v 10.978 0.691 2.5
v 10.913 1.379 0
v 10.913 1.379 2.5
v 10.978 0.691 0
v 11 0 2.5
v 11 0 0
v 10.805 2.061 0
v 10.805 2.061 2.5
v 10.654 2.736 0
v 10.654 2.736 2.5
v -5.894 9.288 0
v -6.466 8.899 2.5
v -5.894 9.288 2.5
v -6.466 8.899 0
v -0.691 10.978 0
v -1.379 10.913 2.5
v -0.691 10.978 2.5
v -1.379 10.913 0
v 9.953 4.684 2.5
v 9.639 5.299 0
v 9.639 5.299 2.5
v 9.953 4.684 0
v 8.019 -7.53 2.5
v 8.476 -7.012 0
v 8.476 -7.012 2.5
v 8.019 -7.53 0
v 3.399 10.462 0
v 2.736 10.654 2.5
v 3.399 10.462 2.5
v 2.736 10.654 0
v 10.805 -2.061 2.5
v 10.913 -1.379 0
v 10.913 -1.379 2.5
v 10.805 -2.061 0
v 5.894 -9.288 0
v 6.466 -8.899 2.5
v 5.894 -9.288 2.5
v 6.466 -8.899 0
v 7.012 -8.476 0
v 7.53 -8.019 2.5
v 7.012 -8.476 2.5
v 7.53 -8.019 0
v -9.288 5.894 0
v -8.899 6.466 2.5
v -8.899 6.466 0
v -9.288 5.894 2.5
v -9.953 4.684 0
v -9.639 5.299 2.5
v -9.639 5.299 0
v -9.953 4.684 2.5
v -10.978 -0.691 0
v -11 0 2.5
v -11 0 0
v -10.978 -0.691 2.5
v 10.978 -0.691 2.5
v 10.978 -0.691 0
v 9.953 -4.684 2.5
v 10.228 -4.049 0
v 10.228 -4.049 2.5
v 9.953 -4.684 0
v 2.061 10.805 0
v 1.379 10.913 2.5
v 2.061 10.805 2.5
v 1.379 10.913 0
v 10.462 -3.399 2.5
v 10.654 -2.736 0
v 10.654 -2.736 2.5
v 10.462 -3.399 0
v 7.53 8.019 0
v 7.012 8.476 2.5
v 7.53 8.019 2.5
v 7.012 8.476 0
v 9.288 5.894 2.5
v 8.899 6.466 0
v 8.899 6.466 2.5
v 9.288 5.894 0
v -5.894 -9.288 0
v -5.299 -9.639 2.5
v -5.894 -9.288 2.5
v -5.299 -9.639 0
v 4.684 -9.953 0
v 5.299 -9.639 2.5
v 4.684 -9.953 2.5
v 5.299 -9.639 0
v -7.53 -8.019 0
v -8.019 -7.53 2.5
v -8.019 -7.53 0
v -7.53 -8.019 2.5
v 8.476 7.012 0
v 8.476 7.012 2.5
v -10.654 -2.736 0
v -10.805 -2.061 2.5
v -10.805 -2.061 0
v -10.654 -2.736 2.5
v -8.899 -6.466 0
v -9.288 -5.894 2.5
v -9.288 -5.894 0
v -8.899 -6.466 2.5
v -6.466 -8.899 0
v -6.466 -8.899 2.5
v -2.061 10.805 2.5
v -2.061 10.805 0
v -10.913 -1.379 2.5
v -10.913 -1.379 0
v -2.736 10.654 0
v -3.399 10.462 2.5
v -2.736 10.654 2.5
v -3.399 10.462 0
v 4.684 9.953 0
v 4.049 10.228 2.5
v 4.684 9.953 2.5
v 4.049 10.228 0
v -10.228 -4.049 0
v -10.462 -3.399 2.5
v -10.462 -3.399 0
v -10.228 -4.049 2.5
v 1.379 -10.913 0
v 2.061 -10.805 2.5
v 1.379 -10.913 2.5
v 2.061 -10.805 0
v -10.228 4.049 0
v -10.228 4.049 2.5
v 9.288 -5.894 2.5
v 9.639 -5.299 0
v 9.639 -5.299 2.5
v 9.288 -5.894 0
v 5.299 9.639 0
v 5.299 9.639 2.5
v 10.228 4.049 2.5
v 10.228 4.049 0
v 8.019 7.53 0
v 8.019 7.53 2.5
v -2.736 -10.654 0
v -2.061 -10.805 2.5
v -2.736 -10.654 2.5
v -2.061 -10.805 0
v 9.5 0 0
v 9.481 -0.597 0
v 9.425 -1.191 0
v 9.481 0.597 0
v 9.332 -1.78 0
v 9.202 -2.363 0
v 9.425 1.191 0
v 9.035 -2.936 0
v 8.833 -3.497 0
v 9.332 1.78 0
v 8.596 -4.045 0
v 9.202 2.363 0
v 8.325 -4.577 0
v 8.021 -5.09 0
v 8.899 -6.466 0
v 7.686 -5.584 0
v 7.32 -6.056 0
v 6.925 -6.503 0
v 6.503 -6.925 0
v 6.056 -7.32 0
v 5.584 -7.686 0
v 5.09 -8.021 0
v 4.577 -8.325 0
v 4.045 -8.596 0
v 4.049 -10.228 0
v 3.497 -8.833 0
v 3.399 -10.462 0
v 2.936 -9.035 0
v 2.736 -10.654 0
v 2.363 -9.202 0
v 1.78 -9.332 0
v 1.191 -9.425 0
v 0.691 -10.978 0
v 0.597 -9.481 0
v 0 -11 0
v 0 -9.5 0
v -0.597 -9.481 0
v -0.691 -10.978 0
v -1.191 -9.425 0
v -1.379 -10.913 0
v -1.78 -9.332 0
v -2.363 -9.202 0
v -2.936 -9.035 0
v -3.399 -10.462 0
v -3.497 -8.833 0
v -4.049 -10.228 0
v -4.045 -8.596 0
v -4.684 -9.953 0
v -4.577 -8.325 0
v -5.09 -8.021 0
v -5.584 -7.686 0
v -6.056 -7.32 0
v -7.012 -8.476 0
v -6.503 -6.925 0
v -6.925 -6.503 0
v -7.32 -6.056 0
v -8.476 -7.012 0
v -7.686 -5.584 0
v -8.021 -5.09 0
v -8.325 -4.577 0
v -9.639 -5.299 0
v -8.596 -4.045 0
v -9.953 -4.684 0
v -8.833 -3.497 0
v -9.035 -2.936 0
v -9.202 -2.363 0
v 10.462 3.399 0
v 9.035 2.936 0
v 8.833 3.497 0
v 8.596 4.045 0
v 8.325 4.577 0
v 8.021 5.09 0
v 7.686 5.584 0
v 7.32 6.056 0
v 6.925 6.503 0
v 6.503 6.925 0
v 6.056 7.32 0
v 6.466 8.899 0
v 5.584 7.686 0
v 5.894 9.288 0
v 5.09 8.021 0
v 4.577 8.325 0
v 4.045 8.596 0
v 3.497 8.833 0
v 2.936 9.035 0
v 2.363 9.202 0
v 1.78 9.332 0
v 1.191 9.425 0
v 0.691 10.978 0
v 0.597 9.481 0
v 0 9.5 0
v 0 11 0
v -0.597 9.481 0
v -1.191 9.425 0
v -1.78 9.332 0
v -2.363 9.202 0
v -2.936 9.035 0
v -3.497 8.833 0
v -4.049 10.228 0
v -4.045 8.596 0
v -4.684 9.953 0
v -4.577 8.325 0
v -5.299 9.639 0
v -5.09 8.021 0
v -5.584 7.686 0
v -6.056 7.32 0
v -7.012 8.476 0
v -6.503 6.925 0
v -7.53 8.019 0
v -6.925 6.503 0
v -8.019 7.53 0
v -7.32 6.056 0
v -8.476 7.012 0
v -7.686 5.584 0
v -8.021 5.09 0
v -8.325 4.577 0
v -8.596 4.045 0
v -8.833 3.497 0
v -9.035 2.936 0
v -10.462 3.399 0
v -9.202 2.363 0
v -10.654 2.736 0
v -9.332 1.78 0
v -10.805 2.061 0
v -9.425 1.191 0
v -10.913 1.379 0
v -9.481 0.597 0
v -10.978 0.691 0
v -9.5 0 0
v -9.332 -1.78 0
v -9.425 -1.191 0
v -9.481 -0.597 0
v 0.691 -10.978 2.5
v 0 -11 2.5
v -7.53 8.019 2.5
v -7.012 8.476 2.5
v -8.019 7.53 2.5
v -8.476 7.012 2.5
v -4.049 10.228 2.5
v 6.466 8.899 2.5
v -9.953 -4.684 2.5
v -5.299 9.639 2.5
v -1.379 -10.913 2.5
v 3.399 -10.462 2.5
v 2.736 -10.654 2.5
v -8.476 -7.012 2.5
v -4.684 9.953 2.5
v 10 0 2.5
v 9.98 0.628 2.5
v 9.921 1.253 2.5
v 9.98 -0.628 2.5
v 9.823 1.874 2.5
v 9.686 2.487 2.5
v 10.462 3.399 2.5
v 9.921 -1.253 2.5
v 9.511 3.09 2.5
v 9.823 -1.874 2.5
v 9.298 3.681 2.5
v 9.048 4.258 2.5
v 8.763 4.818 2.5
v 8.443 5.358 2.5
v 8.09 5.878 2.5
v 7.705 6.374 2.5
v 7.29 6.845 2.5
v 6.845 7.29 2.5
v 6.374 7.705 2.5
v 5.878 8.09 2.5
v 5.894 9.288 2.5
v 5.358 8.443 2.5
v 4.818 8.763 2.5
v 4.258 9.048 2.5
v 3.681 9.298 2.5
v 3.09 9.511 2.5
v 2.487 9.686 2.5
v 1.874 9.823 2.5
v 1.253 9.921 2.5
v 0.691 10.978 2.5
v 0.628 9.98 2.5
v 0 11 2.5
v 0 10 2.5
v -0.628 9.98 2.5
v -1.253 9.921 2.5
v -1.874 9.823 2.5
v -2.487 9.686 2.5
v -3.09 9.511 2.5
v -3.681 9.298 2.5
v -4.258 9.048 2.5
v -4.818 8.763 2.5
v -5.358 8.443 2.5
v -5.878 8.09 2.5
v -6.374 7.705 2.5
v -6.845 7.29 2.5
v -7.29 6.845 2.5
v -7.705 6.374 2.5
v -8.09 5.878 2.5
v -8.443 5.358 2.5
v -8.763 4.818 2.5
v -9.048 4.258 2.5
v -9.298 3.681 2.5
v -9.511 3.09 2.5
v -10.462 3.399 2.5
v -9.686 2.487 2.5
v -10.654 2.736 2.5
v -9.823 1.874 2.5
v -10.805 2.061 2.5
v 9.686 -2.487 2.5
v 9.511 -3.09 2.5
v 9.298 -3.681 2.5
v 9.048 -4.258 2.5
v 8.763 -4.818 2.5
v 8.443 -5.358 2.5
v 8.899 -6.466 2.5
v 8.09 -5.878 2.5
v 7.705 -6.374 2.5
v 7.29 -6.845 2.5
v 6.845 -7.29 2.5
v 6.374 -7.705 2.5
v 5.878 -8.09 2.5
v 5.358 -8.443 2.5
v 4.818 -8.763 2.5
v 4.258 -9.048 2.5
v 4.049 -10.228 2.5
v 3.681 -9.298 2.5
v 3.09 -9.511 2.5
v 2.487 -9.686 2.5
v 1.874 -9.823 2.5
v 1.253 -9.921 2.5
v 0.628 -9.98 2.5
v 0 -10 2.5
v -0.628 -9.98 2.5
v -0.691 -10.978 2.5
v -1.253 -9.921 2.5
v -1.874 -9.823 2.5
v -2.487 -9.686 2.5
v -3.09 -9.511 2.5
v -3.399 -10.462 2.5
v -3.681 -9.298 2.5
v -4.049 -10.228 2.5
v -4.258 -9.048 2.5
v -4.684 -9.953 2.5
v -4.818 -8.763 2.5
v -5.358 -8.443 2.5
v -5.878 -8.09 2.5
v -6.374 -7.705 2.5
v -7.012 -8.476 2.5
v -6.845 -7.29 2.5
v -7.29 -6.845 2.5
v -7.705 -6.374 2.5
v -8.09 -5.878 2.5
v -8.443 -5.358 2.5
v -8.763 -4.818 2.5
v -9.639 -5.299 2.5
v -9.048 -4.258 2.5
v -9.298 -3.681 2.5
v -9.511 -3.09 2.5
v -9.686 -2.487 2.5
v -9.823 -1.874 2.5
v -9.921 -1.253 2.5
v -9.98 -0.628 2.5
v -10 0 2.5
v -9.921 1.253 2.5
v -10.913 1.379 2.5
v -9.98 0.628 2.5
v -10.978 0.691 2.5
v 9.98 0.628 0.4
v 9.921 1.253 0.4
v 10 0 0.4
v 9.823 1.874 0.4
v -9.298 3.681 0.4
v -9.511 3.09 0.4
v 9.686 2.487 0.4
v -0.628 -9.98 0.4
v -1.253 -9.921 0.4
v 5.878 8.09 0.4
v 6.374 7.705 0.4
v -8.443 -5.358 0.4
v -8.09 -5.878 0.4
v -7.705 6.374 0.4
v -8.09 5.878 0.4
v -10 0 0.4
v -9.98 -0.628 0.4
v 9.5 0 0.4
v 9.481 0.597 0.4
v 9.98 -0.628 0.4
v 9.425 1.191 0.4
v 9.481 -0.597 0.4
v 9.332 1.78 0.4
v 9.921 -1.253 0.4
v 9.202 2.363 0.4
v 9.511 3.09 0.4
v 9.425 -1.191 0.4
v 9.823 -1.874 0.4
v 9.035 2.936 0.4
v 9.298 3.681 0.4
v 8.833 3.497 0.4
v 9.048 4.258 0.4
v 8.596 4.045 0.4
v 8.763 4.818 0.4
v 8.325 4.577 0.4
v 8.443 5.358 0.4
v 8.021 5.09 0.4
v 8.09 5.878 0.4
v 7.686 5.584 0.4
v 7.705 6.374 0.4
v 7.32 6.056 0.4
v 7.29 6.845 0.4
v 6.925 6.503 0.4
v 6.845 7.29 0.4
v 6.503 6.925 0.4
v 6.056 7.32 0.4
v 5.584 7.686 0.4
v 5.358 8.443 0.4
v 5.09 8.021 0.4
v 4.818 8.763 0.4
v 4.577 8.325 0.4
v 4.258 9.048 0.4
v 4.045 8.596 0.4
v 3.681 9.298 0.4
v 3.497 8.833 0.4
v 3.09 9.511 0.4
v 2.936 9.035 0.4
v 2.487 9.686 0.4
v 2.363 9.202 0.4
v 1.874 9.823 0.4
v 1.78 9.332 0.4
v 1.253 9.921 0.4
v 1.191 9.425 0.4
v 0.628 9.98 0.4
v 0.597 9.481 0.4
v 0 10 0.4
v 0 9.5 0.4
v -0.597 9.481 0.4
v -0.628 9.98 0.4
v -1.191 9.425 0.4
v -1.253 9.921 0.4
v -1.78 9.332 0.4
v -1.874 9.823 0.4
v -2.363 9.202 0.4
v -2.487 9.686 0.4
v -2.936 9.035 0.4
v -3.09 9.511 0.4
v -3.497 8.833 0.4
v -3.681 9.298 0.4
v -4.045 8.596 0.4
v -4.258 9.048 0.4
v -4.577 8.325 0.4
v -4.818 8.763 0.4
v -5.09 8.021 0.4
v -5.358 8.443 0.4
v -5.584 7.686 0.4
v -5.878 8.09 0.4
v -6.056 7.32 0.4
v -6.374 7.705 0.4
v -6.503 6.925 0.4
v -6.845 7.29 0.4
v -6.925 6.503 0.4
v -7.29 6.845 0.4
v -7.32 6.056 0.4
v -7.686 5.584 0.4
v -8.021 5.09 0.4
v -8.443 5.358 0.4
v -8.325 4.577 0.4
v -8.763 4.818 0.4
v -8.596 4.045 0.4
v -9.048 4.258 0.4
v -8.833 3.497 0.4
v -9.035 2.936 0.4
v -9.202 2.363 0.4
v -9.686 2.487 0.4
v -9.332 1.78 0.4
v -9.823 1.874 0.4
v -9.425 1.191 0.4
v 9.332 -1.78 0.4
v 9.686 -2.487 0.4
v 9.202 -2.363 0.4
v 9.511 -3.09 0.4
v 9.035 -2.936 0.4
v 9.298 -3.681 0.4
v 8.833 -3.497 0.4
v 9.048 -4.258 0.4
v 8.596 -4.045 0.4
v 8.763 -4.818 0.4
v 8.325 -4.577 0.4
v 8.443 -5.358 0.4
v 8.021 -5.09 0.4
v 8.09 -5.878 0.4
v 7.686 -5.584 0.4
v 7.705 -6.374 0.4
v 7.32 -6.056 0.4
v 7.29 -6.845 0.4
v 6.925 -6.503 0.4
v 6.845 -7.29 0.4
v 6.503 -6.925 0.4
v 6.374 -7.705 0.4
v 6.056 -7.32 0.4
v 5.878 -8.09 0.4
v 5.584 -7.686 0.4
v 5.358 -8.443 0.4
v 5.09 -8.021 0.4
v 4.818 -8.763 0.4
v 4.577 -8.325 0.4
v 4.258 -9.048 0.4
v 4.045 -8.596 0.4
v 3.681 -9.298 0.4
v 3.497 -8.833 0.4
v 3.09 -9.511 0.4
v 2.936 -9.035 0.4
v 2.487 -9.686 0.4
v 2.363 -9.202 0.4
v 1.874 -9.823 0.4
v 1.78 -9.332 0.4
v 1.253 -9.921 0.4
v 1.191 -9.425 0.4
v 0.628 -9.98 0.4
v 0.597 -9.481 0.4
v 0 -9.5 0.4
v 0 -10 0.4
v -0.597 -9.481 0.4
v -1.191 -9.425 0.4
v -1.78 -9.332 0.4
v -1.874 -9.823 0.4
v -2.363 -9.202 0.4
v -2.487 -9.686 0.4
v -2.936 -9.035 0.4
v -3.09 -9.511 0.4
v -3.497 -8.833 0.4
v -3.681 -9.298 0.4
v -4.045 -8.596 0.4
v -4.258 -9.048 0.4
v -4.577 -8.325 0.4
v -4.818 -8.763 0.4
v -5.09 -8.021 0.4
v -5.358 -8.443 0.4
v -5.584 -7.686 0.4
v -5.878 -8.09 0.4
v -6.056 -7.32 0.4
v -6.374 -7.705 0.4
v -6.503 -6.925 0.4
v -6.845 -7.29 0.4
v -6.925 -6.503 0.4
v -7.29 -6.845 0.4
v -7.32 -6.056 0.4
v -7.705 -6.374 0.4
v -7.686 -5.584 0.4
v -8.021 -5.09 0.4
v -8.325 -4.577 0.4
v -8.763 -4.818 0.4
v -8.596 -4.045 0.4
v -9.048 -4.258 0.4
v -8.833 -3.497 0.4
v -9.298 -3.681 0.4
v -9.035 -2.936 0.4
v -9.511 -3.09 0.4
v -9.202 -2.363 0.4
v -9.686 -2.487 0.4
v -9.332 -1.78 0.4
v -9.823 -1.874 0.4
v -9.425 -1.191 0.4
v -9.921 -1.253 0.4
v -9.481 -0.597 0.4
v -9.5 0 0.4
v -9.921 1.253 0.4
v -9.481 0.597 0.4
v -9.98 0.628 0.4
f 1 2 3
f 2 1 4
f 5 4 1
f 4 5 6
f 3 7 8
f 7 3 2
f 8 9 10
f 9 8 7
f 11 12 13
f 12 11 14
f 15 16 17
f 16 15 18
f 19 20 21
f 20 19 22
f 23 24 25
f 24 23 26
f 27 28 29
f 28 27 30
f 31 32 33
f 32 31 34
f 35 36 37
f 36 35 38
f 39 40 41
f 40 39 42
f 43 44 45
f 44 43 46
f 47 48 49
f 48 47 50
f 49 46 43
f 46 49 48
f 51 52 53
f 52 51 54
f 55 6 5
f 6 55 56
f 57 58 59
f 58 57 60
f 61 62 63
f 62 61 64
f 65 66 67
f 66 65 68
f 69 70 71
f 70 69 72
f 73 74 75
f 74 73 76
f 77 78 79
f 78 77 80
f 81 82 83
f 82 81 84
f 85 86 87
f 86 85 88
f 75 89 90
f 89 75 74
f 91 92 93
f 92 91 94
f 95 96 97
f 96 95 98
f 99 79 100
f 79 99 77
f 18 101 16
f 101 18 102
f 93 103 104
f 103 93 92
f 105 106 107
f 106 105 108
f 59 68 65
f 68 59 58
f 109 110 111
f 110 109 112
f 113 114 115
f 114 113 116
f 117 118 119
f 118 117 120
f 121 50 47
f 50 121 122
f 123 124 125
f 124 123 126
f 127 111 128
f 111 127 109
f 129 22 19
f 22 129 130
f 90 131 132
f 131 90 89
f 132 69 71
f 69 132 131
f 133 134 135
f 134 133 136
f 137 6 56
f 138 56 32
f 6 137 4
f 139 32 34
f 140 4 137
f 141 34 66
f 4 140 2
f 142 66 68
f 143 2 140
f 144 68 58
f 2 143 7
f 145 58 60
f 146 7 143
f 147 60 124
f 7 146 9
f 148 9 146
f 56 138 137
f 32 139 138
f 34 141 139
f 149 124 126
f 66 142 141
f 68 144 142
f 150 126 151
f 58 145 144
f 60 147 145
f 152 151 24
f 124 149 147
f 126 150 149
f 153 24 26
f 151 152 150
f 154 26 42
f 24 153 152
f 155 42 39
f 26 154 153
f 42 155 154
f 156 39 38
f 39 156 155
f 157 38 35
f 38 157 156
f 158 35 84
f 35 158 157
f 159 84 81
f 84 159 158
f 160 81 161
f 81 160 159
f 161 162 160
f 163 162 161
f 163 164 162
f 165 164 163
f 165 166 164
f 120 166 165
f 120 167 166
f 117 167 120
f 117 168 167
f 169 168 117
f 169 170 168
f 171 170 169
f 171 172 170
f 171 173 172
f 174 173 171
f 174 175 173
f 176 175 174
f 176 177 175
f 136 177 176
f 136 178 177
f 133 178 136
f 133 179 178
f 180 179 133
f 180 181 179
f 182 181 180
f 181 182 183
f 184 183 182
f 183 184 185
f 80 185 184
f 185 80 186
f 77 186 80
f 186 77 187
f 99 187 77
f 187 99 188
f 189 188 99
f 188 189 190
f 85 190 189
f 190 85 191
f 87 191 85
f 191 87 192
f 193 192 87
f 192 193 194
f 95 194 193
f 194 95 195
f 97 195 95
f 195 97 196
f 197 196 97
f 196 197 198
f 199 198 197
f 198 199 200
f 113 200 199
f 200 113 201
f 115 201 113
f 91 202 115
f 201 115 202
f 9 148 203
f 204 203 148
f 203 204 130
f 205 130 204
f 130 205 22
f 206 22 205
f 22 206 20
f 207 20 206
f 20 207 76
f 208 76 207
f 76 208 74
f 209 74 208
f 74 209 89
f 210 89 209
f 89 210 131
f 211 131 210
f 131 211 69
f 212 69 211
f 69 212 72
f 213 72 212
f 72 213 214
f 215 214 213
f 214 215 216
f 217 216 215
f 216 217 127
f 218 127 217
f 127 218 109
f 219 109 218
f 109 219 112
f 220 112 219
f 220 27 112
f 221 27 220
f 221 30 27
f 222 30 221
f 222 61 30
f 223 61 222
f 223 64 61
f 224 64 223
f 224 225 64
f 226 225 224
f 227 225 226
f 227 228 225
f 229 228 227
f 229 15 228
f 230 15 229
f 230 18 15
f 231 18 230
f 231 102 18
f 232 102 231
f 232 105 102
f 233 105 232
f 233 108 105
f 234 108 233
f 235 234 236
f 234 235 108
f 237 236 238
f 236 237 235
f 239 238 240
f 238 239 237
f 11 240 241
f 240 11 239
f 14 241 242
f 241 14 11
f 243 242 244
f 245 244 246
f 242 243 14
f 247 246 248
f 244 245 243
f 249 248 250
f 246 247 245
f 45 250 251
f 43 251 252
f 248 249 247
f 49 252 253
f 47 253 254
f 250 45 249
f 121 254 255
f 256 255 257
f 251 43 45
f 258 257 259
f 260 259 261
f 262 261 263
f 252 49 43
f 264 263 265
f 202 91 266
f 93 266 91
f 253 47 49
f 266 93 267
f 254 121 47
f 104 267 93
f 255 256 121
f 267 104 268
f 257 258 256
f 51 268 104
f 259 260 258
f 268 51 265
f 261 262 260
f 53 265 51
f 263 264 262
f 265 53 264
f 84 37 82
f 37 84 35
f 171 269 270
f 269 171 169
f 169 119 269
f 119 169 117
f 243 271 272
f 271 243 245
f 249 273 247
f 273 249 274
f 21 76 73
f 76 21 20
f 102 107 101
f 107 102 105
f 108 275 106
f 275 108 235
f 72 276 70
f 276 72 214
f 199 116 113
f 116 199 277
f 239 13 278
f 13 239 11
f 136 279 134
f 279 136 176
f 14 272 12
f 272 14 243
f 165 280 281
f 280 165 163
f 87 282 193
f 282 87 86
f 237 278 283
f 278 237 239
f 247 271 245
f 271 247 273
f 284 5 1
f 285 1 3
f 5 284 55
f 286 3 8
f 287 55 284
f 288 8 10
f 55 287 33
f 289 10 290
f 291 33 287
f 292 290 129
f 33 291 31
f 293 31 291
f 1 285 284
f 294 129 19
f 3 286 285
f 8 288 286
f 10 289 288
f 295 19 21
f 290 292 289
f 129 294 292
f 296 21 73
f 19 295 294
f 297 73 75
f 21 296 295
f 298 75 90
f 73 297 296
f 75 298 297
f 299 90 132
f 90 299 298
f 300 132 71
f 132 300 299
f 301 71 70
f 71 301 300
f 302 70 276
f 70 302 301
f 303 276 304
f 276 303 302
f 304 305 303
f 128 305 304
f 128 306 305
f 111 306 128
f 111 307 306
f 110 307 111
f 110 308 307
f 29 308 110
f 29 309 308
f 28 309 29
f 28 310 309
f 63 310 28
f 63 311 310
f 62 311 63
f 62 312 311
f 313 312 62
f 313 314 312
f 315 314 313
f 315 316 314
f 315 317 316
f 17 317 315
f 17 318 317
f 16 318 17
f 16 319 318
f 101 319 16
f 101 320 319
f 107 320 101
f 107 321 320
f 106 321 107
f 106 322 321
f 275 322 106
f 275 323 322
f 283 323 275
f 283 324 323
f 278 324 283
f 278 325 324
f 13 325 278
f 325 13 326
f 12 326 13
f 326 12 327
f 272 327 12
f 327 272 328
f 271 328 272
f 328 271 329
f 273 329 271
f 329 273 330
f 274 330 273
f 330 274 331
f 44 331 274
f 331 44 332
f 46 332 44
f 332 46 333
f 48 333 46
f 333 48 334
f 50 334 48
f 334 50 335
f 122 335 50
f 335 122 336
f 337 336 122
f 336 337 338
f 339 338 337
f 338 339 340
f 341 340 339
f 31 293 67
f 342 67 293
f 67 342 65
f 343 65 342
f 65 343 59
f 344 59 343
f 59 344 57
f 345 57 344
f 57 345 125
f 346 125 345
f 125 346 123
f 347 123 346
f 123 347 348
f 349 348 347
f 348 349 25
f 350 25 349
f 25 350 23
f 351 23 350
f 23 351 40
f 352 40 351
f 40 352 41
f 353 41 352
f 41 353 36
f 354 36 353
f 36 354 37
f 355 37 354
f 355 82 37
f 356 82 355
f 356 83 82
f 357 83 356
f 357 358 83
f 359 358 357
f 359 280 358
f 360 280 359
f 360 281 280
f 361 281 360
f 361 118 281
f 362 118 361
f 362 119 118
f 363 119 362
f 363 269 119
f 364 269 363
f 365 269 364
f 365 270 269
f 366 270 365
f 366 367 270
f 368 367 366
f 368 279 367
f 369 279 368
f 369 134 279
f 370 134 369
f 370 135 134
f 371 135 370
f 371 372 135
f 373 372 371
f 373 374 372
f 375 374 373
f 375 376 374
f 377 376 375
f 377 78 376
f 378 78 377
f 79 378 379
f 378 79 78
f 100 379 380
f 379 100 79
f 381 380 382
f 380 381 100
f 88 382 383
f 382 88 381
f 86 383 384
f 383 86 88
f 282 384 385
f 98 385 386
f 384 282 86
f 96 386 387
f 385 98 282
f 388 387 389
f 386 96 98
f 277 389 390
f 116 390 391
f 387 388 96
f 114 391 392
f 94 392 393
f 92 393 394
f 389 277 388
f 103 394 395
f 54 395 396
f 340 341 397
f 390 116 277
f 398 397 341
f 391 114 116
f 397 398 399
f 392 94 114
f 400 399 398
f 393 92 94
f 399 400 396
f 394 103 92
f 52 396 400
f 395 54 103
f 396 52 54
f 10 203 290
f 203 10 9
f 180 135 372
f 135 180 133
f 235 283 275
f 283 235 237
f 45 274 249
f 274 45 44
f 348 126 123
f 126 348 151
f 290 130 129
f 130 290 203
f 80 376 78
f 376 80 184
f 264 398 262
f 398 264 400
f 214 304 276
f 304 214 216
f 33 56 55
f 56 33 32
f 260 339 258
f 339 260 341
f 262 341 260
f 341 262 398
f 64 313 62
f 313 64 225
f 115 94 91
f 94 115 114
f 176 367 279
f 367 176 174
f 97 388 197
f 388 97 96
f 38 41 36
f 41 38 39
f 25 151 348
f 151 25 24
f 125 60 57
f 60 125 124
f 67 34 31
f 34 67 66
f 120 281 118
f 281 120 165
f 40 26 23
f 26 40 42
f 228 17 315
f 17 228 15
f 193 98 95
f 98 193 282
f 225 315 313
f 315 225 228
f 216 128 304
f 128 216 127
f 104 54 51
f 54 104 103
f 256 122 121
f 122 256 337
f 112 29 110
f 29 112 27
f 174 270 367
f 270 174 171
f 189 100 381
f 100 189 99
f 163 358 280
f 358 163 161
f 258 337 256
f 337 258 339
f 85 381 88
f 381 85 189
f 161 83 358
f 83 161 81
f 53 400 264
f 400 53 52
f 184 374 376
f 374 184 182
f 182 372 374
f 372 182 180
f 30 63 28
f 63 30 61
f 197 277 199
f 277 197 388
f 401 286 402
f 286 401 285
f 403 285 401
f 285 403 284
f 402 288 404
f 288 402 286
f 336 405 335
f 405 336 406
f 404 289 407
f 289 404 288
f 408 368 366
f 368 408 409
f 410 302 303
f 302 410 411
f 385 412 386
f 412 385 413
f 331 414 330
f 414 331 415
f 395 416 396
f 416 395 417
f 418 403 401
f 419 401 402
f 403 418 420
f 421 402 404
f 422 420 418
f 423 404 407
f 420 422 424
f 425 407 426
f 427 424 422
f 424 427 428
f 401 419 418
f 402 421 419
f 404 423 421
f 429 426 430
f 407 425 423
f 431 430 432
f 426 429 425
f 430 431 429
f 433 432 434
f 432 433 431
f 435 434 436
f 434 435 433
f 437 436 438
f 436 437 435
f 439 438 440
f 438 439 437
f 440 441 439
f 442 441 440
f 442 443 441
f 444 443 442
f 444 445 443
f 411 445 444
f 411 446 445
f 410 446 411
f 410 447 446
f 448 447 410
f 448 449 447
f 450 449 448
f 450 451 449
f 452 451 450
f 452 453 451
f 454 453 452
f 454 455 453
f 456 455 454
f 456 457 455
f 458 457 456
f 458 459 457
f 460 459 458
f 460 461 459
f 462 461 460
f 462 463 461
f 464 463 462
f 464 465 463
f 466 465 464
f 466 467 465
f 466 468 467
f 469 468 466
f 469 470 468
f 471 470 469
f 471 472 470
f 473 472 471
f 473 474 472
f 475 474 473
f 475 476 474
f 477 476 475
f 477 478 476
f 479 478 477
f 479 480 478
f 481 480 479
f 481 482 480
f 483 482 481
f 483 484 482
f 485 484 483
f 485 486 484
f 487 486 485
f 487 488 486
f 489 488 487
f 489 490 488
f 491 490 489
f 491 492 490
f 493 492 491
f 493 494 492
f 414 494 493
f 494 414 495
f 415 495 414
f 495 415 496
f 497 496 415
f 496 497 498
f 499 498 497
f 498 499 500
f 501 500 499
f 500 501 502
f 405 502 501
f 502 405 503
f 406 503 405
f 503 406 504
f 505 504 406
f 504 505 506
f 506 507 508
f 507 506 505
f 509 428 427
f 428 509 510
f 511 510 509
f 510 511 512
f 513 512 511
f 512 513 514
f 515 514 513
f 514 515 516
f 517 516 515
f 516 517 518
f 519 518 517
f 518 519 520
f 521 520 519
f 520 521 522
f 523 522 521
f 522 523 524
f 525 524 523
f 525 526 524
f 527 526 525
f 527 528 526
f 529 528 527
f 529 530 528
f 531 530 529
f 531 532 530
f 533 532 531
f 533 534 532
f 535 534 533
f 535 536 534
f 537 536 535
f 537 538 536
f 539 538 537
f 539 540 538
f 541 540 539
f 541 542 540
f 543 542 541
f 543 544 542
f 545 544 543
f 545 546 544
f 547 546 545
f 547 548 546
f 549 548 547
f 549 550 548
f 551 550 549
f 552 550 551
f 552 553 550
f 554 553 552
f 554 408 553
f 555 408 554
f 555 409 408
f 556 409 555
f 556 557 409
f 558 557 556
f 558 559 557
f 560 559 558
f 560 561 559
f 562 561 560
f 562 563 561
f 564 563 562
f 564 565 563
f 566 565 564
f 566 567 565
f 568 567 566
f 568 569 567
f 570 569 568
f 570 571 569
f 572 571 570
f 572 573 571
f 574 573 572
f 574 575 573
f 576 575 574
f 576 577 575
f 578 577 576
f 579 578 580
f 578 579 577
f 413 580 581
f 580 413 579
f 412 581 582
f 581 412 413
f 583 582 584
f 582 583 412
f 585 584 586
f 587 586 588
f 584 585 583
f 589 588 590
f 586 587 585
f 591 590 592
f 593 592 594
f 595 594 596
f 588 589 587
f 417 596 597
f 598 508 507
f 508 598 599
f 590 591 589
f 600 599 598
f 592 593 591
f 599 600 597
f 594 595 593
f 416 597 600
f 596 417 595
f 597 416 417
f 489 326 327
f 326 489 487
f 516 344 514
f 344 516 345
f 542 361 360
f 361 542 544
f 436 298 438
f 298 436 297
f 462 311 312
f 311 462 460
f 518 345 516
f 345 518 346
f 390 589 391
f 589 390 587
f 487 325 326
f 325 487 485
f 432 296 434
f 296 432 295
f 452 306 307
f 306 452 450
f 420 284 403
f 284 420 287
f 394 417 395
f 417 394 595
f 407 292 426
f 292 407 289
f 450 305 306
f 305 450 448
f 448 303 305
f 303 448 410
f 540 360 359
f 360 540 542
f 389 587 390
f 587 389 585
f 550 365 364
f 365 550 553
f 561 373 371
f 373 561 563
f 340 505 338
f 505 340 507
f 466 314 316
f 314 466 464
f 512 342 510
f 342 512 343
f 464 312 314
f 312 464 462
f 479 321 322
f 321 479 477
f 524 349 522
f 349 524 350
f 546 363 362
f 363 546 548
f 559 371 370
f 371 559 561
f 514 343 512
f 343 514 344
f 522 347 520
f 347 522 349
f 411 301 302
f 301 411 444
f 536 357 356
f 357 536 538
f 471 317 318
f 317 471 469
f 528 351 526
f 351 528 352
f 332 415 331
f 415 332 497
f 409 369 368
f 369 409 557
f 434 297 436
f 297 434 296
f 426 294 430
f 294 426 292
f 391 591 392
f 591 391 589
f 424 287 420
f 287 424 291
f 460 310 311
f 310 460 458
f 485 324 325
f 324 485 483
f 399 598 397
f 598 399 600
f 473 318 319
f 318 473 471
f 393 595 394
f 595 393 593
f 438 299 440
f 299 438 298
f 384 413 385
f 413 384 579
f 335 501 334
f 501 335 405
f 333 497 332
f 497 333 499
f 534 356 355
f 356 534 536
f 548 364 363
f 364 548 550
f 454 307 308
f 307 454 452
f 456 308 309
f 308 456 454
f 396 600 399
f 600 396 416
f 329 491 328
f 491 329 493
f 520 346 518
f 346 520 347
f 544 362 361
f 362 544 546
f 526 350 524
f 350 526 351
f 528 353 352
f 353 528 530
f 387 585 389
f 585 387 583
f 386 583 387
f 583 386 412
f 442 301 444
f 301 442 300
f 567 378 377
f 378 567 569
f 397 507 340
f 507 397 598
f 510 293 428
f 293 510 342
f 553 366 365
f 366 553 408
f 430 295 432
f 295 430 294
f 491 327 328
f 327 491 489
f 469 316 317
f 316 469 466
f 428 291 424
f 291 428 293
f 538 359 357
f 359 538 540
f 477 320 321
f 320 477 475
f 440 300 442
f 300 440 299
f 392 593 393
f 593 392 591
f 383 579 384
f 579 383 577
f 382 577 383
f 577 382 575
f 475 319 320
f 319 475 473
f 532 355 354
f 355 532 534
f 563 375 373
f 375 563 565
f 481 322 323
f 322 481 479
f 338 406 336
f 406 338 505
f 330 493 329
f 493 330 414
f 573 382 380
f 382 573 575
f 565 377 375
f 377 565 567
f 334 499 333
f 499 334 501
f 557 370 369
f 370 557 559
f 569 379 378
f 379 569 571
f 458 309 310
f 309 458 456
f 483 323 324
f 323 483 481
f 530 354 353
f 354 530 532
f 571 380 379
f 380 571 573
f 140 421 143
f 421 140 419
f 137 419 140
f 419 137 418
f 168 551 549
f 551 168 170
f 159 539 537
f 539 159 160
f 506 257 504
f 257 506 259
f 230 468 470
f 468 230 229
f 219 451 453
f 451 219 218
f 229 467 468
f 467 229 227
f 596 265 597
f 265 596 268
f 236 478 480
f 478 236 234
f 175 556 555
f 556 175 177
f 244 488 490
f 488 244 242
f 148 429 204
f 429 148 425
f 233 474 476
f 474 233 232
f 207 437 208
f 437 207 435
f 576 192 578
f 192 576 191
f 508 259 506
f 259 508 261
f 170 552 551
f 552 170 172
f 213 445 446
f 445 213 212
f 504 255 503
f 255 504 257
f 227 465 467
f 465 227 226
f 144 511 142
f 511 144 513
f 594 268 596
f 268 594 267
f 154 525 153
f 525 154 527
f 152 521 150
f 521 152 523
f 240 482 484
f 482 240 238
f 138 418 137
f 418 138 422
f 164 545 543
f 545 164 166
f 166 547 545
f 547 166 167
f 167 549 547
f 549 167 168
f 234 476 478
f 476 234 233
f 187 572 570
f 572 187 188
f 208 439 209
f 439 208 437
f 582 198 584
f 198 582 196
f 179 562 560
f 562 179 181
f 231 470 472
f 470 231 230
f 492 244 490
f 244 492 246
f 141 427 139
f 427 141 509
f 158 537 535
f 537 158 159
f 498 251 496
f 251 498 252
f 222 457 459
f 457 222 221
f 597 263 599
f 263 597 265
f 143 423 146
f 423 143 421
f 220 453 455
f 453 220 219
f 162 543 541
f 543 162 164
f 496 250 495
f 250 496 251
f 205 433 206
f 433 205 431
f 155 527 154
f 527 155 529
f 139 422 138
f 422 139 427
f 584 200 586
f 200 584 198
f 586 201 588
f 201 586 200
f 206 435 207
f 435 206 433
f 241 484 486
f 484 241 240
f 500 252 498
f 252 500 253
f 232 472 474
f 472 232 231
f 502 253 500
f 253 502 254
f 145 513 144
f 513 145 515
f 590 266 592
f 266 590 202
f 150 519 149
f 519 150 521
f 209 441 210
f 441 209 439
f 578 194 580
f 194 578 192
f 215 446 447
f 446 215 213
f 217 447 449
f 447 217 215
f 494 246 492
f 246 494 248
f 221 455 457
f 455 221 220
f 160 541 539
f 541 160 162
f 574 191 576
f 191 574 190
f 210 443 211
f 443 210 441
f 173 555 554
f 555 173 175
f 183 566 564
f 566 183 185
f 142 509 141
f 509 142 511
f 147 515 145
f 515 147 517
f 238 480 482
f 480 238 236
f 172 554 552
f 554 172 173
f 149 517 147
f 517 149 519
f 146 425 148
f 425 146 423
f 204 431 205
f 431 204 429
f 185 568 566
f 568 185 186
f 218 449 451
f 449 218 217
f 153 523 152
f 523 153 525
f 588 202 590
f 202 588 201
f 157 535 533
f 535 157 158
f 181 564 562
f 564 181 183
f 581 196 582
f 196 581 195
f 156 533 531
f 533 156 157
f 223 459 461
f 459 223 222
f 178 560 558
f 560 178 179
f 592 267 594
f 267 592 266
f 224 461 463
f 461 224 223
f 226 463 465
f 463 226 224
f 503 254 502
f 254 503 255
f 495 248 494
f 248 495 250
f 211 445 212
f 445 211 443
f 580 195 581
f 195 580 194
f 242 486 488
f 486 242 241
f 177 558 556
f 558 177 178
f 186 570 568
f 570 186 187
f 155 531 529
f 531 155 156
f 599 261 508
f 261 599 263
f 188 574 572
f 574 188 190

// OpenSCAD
insert_font = "Orthodox Herbertarian:style=Regular";

include <../../The-Boardgame-Insert-Toolkit/boardgame_insert_toolkit_lib.2.scad>;
include <../../BFD-Insert-Extensions/InsertExtensions.scad>;



g_b_print_lid = true;
g_b_print_box = false; 
g_wall_thickness = 2.0;
g_lid_thickness = 2.0;
g_min_bottom_thickness = 1.0;

// The tolerance value is extra space put between planes of the lid and box that fit together.
// Increase the tolerance to loosen the fit and decrease it to tighten it.
//
// Note that the tolerance is applied exclusively to the lid.
// So if the lid is too tight or too loose, change this value ( up for looser fit, down for tighter fit ) and 
// you only need to reprint the lid.
// 
// The exception is the stackable box, where the bottom of the box is the lid of the box below,
// in which case the tolerance also affects that box bottom.
//
g_tolerance = 0.15;

// This adjusts the position of the lid detents downward. 
// The larger the value, the bigger the gap between the lid and the box.
g_tolerance_detents_pos = 0.1;
card_sizes = [[61,92]];
card_width = 61;
card_height = 92;

cardPositions = [[0,0]];

treacheryCardSizes = [[67.5,93,31]];
treacheryLabel = compartmentLabel(label=[["Treachery"]],size=10,rotation = 90,position=[0,0],depth=1);
function treacheryBox() = freeFormBox4( "Treachery Box",cardPositions,treacheryCardSizes, 71.5,97, 33,cutout_bottom=[f,f],bottom_cutout_pct = 50,label_data=[""],lid_patt_radius=5,fit_under=false,lid_inset=true,lid_height=4,stackable = false,lid_tabs = [f,f,f,f],cutout_sides=[[f,f,t,t]],side_cutout_height_pct=100,invert_labels=false,compLabel=[[treacheryLabel]],stack="1");


allianceStormCardSizes = [[67.5,93,11]];
allianceLabel = compartmentLabel(label=[["Alliance"]],size=10,rotation = 90,position=[0,8],depth=1);
stormLabel = compartmentLabel(label=[["Storm-Kwiz"]],size=10,rotation = 90,position=[0,-8],depth=1);
function allianceStormBox() = freeFormBox4( "Alliance Storm Box",cardPositions,allianceStormCardSizes, 71.5,97, 13,cutout_bottom=[f,f],bottom_cutout_pct = 50,label_data=[""],lid_patt_radius=5,fit_under=false,lid_inset=false,lid_height=4,stackable = true,lid_tabs = [t,t,f,f],cutout_sides=[[f,f,t,t]],side_cutout_height_pct=100,invert_labels=false,compLabel=[[allianceLabel,stormLabel]],stack="1");

traitorCardSizes = [[67.5,93,31]];
traitoryLabel = compartmentLabel(label=[["Traitor"]],size=10,rotation = 90,position=[0,0],depth=1);
function traitorBox() = freeFormBox4( "Traitor Box",cardPositions,traitorCardSizes, 71.5,97, 33,cutout_bottom=[f,f],bottom_cutout_pct = 50,label_data=[""],lid_patt_radius=5,fit_under=false,lid_inset=true,lid_height=4,stackable = false,lid_tabs = [t,t,f,f],cutout_sides=[[f,f,t,t]],side_cutout_height_pct=100,invert_labels=false,compLabel=[[traitoryLabel]],stack="2");

leaderStrongCardSizes = [[67.5,93,11]];
leaderLabel = compartmentLabel(label=[["Leader Skills"]],size=9,rotation = 90,position=[0,8],depth=1);
strongholdLabel = compartmentLabel(label=[["Stronghold"]],size=9,rotation = 90,position=[0,-8],depth=1);
function leaderStrongBox() = freeFormBox4( "Leader Strong Box",cardPositions,leaderStrongCardSizes, 71.5,97, 13,cutout_bottom=[f,f],bottom_cutout_pct = 50,label_data=[""],lid_patt_radius=5,fit_under=false,lid_inset=false,lid_height=4,stackable = true,lid_tabs = [t,t,f,f],cutout_sides=[[f,f,t,t]],side_cutout_height_pct=100,invert_labels=false,compLabel=[[leaderLabel,strongholdLabel]],stack="2");

spiceCardSizes = [[67.5,93,15]];
spiceLabel = compartmentLabel(label=[["Spice"]],size=10,rotation = 90,position=[0,0],depth=1);
function spiceBox() = freeFormBox4( "Spice Box",cardPositions,spiceCardSizes, 71.5,97, 17,cutout_bottom=[f,f],bottom_cutout_pct = 50,label_data=[""],lid_patt_radius=5,fit_under=false,lid_inset=true,lid_height=4,stackable = false,lid_tabs = [t,t,f,f],cutout_sides=[[f,f,t,t]],side_cutout_height_pct=100,invert_labels=false,compLabel=[[spiceLabel]],stack="3");

preditcionCardSizes = [[67.5,93,11]];
predictionLabel = compartmentLabel(label=[["Prediction"]],size=10,rotation = 90,position=[0,0],depth=1);

function predictionBox() = freeFormBox4( "Prediction Box",cardPositions,preditcionCardSizes, 71.5,97, 13,cutout_bottom=[f,f],bottom_cutout_pct = 50,label_data=[""],lid_patt_radius=5,fit_under=false,lid_inset=true,lid_height=4,stackable = true,lid_tabs = [t,t,f,f],cutout_sides=[[f,f,t,t]],side_cutout_height_pct=100,invert_labels=false,compLabel=[[predictionLabel]],stack="3");

nexusHomeCardSizes = [[67.5,93,12]];
nexusLabel = compartmentLabel(label=[["Nexus"]],size=10,rotation = 90,position=[0,8],depth=1);
homeLabel = compartmentLabel(label=[["HomeWorlds"]],size=10,rotation = 90,position=[0,-8],depth=1);
function leaderStrongBox() = freeFormBox4( "Nexus Home Box",cardPositions,nexusHomeCardSizes, 71.5,97, 14,cutout_bottom=[f,f],bottom_cutout_pct = 50,label_data=[""],lid_patt_radius=5,fit_under=false,lid_inset=false,lid_height=4,stackable = true,lid_tabs = [t,t,f,f],cutout_sides=[[f,f,t,t]],side_cutout_height_pct=100,invert_labels=false,compLabel=[[nexusLabel,homeLabel]],stack="2");


bottomCutoutSides = [[f,f,t,t],[f,f,t,t],[f,f,t,t],[f,f,t,t],[f,f,t,t],[f,f,t,t]];
bottomTroopsSizes = [[ 70.5, 19, 19],[ 70.5, 19, 19],[ 70.5, 19, 19],[ 70.5, 19, 19],[70.5, 19, 19],[ 70.5, 19, 19]];
bottomTroopPositions = [[0,0],[0,20],[0,40],[0,60],[0,80],[0,100]];
function bottomTroopsBox() = freeFormBox4( "Bottom Troops Box",bottomTroopPositions,bottomTroopsSizes, 74.5,123,21,label_data=[""],lid_patt_radius=5,fit_under=false,lid_inset=true,lid_height=4,stackable = false,lid_tabs = [t,t,f,f],cutout_sides=bottomCutoutSides,side_cutout_height_pct=50,invert_labels=false,shapes=[ROUND],rotate_shape=f,side_cutout_width_pct=75);

function topTroopsBox() = freeFormBox4( "Top Troops Box",bottomTroopPositions,bottomTroopsSizes, 74.5,123,21,label_data=["Troops"],label_size=15,label_rotation=90,lid_patt_radius=5,fit_under=false,lid_inset=false,lid_height=4,stackable = true,lid_tabs = [t,t,f,f],cutout_sides=bottomCutoutSides,side_cutout_height_pct=50,invert_labels=false,shapes=[ROUND],rotate_shape=f,side_cutout_width_pct=75);

battleWheelSizes = [[126,126,13]];
battleWheelPositions = [[0,0]];
function battleWheelsBox() = freeFormBox4( "Battle Wheels Box",battleWheelPositions,battleWheelSizes, 130,130, 15,cutout_bottom=[t],bottom_cutout_pct = 15,label_data=["DUNE"],label_size=15,lid_patt_radius=8,fit_under=false,lid_inset=false,lid_height=4,stackable = false,lid_tabs = [f,f,f,f],cutout_sides=[[t,t,t,t]],side_cutout_height_pct=100,invert_labels=false,shapes=[ROUND],rotate_shape=t,side_cutout_width_pct=40);

leadersCutoutSides = [[f,f,t,t],[f,f,t,t],[f,f,t,t],[f,f,t,t],[f,f,t,t],[f,f,t,t],[f,f,t,t],[f,f,t,t],[f,f,t,t]];
leadersSizes = [[ 12, 40.5, 40.5],[ 12, 40.5, 40.5],[ 12, 40.5, 40.5],[ 12, 40.5, 40.5],[ 12, 40.5, 40.5],[ 12, 40.5, 40.5],[ 12, 40.5, 40.5],[ 12, 40.5, 40.5],[ 12, 40.5, 40.5]];
leaderPositions = [[0,0],[0,41.5],[0,83],[13,0],[13,41.5],[13,83],[26,0],[26,41.5],[26,83]];
function leadersBox() = freeFormBox4( "Leaders Box",leaderPositions,leadersSizes, 42,127.5,42.5,label_data=["Leaders"],label_size=10,label_rotation=90,lid_patt_radius=5,fit_under=false,lid_inset=false,lid_height=4,stackable = false,lid_tabs = [t,t,f,f],cutout_sides=leadersCutoutSides,side_cutout_height_pct=50,invert_labels=false,shapes=[ROUND],rotate_shape=f,side_cutout_width_pct=75);

leaders2CutoutSides = [[f,f,t,t],[f,f,t,t],[f,f,t,t]];
leaders2Sizes = [[ 40.5, 40.5, 12],[ 40.5, 40.5, 13.5],[ 40.5, 40.5,13.5]];
leaders2Positions = [[0,0],[0,41.5],[0,83]];
function leaders2Box() = freeFormBox4( "Leaders 2 Box",leaders2Positions,leaders2Sizes, 44.5,127.5,15.5,label_data=["Leaders"],label_size=10,label_rotation=90,lid_patt_radius=5,fit_under=false,lid_inset=false,lid_height=4,stackable = false,lid_tabs = [t,t,f,f],cutout_sides=leadersCutoutSides,side_cutout_height_pct=100,invert_labels=false,shapes=[ROUND],rotate_shape=true,side_cutout_width_pct=50);

planetsCutoutSides = [[f,f,t,t],[f,f,t,t],[f,f,f,f]];
planetsSizes = [[ 61.5, 61.5, 16],[ 61.5, 61.5, 16],[61.5,61.5,2.5]];
planetsPositions = [[0,0],[0,62.5],[0,31.25]];
function planetsBox() = freeFormBox4( "Planets Box",planetsPositions,planetsSizes, 65.5,128,18,label_data=["Planets"],label_size=10,label_rotation=90,lid_patt_radius=5,fit_under=false,lid_inset=false,lid_height=4,stackable = false,lid_tabs = [t,t,f,f],cutout_sides=planetsCutoutSides,side_cutout_height_pct=100,invert_labels=false,shapes=[ROUND,ROUND,ROUND],rotate_shape=true,side_cutout_width_pct=50);

function trooperHolder() = tokenHolder("Trooper Holder",shape=ROUND,size=[17.55, 17.55, 3],
                                    inner_size=[14.9,14.9,2.1],cutout_bottom=true,
                                    cutout_bottom_pct=85);
                                    
 function ambassadorHolder() = tokenHolder("Ambassador Holder",shape=SQUARE,
                                    size=[21.8, 21.8, 2.5],
                                    inner_size=[19.8,19.8,2.1],cutout_bottom=true,
                                    cutout_bottom_pct=95);

 function terrorHolder() = tokenHolder("Terror Holder",shape=ROUND,
                                    size=[21.8, 21.8, 2.5],
                                    inner_size=[19.8,19.8,2.1],cutout_bottom=true,
                                    cutout_bottom_pct=95);
                                                          
function noShipHolder() = tokenHolder("No Ship Holder",shape=ROUND,
                                    size=[22, 22, 2.5],
                                    inner_size=[20,20,2.1],cutout_bottom=true,
                                    cutout_bottom_pct=95);

g_isolated_print_box = "No Ship Holder"; 
 
 data = [
    treacheryBox(), 
    allianceStormBox(),
    traitorBox(),
    leaderStrongBox(),
    spiceBox(),
    predictionBox(),
    bottomTroopsBox(),
    topTroopsBox(),
    battleWheelsBox(),
    leadersBox(),
    leaders2Box(),
    planetsBox(),
    trooperHolder(),
    ambassadorHolder(),
    terrorHolder(),
    noShipHolder(),
 ];
 
MakeAll();
 
 
